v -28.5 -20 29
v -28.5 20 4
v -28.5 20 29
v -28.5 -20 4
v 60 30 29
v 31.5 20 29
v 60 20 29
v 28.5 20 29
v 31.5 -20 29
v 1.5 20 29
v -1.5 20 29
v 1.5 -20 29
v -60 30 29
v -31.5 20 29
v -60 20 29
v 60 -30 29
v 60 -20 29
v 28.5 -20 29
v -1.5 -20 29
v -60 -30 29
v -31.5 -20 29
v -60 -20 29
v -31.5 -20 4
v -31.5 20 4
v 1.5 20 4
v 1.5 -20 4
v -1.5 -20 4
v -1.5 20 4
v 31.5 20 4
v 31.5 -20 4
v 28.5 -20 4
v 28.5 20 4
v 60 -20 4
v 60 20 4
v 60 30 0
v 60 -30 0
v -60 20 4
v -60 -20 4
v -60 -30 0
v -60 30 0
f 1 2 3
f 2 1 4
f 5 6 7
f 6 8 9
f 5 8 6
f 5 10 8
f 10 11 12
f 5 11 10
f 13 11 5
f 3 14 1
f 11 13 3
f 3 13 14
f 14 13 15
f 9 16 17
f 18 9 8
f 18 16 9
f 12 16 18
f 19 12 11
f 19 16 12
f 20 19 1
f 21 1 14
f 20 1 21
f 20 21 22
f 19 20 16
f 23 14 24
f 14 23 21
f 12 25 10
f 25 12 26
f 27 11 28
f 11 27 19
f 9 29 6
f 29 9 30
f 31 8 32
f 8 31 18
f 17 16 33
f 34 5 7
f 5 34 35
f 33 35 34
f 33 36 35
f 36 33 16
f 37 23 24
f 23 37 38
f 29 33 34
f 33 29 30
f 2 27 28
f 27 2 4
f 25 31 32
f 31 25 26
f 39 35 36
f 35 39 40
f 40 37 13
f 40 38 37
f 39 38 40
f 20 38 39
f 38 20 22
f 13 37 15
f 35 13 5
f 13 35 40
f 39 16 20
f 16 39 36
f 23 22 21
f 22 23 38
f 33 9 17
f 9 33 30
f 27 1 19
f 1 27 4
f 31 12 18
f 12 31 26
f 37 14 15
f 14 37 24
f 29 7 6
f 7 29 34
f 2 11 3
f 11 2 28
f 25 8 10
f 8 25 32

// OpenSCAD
$fn = 32;

// ----------------------------------------------------------------------
// Rib frame 120 x 60 x 29
// 3 ribs at 30 mm pitch
// ----------------------------------------------------------------------

// --- parameters (mm) ---
frame = [120, 60, 4];  // base plate size (x, y, z)
rail_w = 10;           // side rail width
ribs = 3;              // number of ribs
rib_t = 3;             // rib thickness
rib_h = 25;            // rib height above the base plate
pitch = 30;            // pitch between rib centres

// --- derived feature positions (mm) ---
span = (ribs - 1) * pitch;          // = 60   distance between the outer ribs
origin_x = -span / 2;               // = -30   X of the first rib
rib_len = frame[1] - 2 * rail_w + 2;  // = 42   rib length, 1 mm into each rail
feature_centers = [
  [origin_x + 0 * pitch, 0],
  [origin_x + 1 * pitch, 0],
  [origin_x + 2 * pitch, 0]
];   // rib centre line, drives the rib loop

// base plate, two side rails, then the ribs read straight off feature_centers
union() {
  translate([-frame[0] / 2, -frame[1] / 2, 0]) cube(frame);
  translate([-frame[0] / 2, -frame[1] / 2, 0]) cube([frame[0], rail_w, frame[2] + rib_h]);
  translate([-frame[0] / 2, frame[1] / 2 - rail_w, 0]) cube([frame[0], rail_w, frame[2] + rib_h]);
  for (centre = feature_centers)
    translate([centre[0] - rib_t / 2, centre[1] - rib_len / 2, frame[2] - 1])
      cube([rib_t, rib_len, rib_h + 1]);
}
